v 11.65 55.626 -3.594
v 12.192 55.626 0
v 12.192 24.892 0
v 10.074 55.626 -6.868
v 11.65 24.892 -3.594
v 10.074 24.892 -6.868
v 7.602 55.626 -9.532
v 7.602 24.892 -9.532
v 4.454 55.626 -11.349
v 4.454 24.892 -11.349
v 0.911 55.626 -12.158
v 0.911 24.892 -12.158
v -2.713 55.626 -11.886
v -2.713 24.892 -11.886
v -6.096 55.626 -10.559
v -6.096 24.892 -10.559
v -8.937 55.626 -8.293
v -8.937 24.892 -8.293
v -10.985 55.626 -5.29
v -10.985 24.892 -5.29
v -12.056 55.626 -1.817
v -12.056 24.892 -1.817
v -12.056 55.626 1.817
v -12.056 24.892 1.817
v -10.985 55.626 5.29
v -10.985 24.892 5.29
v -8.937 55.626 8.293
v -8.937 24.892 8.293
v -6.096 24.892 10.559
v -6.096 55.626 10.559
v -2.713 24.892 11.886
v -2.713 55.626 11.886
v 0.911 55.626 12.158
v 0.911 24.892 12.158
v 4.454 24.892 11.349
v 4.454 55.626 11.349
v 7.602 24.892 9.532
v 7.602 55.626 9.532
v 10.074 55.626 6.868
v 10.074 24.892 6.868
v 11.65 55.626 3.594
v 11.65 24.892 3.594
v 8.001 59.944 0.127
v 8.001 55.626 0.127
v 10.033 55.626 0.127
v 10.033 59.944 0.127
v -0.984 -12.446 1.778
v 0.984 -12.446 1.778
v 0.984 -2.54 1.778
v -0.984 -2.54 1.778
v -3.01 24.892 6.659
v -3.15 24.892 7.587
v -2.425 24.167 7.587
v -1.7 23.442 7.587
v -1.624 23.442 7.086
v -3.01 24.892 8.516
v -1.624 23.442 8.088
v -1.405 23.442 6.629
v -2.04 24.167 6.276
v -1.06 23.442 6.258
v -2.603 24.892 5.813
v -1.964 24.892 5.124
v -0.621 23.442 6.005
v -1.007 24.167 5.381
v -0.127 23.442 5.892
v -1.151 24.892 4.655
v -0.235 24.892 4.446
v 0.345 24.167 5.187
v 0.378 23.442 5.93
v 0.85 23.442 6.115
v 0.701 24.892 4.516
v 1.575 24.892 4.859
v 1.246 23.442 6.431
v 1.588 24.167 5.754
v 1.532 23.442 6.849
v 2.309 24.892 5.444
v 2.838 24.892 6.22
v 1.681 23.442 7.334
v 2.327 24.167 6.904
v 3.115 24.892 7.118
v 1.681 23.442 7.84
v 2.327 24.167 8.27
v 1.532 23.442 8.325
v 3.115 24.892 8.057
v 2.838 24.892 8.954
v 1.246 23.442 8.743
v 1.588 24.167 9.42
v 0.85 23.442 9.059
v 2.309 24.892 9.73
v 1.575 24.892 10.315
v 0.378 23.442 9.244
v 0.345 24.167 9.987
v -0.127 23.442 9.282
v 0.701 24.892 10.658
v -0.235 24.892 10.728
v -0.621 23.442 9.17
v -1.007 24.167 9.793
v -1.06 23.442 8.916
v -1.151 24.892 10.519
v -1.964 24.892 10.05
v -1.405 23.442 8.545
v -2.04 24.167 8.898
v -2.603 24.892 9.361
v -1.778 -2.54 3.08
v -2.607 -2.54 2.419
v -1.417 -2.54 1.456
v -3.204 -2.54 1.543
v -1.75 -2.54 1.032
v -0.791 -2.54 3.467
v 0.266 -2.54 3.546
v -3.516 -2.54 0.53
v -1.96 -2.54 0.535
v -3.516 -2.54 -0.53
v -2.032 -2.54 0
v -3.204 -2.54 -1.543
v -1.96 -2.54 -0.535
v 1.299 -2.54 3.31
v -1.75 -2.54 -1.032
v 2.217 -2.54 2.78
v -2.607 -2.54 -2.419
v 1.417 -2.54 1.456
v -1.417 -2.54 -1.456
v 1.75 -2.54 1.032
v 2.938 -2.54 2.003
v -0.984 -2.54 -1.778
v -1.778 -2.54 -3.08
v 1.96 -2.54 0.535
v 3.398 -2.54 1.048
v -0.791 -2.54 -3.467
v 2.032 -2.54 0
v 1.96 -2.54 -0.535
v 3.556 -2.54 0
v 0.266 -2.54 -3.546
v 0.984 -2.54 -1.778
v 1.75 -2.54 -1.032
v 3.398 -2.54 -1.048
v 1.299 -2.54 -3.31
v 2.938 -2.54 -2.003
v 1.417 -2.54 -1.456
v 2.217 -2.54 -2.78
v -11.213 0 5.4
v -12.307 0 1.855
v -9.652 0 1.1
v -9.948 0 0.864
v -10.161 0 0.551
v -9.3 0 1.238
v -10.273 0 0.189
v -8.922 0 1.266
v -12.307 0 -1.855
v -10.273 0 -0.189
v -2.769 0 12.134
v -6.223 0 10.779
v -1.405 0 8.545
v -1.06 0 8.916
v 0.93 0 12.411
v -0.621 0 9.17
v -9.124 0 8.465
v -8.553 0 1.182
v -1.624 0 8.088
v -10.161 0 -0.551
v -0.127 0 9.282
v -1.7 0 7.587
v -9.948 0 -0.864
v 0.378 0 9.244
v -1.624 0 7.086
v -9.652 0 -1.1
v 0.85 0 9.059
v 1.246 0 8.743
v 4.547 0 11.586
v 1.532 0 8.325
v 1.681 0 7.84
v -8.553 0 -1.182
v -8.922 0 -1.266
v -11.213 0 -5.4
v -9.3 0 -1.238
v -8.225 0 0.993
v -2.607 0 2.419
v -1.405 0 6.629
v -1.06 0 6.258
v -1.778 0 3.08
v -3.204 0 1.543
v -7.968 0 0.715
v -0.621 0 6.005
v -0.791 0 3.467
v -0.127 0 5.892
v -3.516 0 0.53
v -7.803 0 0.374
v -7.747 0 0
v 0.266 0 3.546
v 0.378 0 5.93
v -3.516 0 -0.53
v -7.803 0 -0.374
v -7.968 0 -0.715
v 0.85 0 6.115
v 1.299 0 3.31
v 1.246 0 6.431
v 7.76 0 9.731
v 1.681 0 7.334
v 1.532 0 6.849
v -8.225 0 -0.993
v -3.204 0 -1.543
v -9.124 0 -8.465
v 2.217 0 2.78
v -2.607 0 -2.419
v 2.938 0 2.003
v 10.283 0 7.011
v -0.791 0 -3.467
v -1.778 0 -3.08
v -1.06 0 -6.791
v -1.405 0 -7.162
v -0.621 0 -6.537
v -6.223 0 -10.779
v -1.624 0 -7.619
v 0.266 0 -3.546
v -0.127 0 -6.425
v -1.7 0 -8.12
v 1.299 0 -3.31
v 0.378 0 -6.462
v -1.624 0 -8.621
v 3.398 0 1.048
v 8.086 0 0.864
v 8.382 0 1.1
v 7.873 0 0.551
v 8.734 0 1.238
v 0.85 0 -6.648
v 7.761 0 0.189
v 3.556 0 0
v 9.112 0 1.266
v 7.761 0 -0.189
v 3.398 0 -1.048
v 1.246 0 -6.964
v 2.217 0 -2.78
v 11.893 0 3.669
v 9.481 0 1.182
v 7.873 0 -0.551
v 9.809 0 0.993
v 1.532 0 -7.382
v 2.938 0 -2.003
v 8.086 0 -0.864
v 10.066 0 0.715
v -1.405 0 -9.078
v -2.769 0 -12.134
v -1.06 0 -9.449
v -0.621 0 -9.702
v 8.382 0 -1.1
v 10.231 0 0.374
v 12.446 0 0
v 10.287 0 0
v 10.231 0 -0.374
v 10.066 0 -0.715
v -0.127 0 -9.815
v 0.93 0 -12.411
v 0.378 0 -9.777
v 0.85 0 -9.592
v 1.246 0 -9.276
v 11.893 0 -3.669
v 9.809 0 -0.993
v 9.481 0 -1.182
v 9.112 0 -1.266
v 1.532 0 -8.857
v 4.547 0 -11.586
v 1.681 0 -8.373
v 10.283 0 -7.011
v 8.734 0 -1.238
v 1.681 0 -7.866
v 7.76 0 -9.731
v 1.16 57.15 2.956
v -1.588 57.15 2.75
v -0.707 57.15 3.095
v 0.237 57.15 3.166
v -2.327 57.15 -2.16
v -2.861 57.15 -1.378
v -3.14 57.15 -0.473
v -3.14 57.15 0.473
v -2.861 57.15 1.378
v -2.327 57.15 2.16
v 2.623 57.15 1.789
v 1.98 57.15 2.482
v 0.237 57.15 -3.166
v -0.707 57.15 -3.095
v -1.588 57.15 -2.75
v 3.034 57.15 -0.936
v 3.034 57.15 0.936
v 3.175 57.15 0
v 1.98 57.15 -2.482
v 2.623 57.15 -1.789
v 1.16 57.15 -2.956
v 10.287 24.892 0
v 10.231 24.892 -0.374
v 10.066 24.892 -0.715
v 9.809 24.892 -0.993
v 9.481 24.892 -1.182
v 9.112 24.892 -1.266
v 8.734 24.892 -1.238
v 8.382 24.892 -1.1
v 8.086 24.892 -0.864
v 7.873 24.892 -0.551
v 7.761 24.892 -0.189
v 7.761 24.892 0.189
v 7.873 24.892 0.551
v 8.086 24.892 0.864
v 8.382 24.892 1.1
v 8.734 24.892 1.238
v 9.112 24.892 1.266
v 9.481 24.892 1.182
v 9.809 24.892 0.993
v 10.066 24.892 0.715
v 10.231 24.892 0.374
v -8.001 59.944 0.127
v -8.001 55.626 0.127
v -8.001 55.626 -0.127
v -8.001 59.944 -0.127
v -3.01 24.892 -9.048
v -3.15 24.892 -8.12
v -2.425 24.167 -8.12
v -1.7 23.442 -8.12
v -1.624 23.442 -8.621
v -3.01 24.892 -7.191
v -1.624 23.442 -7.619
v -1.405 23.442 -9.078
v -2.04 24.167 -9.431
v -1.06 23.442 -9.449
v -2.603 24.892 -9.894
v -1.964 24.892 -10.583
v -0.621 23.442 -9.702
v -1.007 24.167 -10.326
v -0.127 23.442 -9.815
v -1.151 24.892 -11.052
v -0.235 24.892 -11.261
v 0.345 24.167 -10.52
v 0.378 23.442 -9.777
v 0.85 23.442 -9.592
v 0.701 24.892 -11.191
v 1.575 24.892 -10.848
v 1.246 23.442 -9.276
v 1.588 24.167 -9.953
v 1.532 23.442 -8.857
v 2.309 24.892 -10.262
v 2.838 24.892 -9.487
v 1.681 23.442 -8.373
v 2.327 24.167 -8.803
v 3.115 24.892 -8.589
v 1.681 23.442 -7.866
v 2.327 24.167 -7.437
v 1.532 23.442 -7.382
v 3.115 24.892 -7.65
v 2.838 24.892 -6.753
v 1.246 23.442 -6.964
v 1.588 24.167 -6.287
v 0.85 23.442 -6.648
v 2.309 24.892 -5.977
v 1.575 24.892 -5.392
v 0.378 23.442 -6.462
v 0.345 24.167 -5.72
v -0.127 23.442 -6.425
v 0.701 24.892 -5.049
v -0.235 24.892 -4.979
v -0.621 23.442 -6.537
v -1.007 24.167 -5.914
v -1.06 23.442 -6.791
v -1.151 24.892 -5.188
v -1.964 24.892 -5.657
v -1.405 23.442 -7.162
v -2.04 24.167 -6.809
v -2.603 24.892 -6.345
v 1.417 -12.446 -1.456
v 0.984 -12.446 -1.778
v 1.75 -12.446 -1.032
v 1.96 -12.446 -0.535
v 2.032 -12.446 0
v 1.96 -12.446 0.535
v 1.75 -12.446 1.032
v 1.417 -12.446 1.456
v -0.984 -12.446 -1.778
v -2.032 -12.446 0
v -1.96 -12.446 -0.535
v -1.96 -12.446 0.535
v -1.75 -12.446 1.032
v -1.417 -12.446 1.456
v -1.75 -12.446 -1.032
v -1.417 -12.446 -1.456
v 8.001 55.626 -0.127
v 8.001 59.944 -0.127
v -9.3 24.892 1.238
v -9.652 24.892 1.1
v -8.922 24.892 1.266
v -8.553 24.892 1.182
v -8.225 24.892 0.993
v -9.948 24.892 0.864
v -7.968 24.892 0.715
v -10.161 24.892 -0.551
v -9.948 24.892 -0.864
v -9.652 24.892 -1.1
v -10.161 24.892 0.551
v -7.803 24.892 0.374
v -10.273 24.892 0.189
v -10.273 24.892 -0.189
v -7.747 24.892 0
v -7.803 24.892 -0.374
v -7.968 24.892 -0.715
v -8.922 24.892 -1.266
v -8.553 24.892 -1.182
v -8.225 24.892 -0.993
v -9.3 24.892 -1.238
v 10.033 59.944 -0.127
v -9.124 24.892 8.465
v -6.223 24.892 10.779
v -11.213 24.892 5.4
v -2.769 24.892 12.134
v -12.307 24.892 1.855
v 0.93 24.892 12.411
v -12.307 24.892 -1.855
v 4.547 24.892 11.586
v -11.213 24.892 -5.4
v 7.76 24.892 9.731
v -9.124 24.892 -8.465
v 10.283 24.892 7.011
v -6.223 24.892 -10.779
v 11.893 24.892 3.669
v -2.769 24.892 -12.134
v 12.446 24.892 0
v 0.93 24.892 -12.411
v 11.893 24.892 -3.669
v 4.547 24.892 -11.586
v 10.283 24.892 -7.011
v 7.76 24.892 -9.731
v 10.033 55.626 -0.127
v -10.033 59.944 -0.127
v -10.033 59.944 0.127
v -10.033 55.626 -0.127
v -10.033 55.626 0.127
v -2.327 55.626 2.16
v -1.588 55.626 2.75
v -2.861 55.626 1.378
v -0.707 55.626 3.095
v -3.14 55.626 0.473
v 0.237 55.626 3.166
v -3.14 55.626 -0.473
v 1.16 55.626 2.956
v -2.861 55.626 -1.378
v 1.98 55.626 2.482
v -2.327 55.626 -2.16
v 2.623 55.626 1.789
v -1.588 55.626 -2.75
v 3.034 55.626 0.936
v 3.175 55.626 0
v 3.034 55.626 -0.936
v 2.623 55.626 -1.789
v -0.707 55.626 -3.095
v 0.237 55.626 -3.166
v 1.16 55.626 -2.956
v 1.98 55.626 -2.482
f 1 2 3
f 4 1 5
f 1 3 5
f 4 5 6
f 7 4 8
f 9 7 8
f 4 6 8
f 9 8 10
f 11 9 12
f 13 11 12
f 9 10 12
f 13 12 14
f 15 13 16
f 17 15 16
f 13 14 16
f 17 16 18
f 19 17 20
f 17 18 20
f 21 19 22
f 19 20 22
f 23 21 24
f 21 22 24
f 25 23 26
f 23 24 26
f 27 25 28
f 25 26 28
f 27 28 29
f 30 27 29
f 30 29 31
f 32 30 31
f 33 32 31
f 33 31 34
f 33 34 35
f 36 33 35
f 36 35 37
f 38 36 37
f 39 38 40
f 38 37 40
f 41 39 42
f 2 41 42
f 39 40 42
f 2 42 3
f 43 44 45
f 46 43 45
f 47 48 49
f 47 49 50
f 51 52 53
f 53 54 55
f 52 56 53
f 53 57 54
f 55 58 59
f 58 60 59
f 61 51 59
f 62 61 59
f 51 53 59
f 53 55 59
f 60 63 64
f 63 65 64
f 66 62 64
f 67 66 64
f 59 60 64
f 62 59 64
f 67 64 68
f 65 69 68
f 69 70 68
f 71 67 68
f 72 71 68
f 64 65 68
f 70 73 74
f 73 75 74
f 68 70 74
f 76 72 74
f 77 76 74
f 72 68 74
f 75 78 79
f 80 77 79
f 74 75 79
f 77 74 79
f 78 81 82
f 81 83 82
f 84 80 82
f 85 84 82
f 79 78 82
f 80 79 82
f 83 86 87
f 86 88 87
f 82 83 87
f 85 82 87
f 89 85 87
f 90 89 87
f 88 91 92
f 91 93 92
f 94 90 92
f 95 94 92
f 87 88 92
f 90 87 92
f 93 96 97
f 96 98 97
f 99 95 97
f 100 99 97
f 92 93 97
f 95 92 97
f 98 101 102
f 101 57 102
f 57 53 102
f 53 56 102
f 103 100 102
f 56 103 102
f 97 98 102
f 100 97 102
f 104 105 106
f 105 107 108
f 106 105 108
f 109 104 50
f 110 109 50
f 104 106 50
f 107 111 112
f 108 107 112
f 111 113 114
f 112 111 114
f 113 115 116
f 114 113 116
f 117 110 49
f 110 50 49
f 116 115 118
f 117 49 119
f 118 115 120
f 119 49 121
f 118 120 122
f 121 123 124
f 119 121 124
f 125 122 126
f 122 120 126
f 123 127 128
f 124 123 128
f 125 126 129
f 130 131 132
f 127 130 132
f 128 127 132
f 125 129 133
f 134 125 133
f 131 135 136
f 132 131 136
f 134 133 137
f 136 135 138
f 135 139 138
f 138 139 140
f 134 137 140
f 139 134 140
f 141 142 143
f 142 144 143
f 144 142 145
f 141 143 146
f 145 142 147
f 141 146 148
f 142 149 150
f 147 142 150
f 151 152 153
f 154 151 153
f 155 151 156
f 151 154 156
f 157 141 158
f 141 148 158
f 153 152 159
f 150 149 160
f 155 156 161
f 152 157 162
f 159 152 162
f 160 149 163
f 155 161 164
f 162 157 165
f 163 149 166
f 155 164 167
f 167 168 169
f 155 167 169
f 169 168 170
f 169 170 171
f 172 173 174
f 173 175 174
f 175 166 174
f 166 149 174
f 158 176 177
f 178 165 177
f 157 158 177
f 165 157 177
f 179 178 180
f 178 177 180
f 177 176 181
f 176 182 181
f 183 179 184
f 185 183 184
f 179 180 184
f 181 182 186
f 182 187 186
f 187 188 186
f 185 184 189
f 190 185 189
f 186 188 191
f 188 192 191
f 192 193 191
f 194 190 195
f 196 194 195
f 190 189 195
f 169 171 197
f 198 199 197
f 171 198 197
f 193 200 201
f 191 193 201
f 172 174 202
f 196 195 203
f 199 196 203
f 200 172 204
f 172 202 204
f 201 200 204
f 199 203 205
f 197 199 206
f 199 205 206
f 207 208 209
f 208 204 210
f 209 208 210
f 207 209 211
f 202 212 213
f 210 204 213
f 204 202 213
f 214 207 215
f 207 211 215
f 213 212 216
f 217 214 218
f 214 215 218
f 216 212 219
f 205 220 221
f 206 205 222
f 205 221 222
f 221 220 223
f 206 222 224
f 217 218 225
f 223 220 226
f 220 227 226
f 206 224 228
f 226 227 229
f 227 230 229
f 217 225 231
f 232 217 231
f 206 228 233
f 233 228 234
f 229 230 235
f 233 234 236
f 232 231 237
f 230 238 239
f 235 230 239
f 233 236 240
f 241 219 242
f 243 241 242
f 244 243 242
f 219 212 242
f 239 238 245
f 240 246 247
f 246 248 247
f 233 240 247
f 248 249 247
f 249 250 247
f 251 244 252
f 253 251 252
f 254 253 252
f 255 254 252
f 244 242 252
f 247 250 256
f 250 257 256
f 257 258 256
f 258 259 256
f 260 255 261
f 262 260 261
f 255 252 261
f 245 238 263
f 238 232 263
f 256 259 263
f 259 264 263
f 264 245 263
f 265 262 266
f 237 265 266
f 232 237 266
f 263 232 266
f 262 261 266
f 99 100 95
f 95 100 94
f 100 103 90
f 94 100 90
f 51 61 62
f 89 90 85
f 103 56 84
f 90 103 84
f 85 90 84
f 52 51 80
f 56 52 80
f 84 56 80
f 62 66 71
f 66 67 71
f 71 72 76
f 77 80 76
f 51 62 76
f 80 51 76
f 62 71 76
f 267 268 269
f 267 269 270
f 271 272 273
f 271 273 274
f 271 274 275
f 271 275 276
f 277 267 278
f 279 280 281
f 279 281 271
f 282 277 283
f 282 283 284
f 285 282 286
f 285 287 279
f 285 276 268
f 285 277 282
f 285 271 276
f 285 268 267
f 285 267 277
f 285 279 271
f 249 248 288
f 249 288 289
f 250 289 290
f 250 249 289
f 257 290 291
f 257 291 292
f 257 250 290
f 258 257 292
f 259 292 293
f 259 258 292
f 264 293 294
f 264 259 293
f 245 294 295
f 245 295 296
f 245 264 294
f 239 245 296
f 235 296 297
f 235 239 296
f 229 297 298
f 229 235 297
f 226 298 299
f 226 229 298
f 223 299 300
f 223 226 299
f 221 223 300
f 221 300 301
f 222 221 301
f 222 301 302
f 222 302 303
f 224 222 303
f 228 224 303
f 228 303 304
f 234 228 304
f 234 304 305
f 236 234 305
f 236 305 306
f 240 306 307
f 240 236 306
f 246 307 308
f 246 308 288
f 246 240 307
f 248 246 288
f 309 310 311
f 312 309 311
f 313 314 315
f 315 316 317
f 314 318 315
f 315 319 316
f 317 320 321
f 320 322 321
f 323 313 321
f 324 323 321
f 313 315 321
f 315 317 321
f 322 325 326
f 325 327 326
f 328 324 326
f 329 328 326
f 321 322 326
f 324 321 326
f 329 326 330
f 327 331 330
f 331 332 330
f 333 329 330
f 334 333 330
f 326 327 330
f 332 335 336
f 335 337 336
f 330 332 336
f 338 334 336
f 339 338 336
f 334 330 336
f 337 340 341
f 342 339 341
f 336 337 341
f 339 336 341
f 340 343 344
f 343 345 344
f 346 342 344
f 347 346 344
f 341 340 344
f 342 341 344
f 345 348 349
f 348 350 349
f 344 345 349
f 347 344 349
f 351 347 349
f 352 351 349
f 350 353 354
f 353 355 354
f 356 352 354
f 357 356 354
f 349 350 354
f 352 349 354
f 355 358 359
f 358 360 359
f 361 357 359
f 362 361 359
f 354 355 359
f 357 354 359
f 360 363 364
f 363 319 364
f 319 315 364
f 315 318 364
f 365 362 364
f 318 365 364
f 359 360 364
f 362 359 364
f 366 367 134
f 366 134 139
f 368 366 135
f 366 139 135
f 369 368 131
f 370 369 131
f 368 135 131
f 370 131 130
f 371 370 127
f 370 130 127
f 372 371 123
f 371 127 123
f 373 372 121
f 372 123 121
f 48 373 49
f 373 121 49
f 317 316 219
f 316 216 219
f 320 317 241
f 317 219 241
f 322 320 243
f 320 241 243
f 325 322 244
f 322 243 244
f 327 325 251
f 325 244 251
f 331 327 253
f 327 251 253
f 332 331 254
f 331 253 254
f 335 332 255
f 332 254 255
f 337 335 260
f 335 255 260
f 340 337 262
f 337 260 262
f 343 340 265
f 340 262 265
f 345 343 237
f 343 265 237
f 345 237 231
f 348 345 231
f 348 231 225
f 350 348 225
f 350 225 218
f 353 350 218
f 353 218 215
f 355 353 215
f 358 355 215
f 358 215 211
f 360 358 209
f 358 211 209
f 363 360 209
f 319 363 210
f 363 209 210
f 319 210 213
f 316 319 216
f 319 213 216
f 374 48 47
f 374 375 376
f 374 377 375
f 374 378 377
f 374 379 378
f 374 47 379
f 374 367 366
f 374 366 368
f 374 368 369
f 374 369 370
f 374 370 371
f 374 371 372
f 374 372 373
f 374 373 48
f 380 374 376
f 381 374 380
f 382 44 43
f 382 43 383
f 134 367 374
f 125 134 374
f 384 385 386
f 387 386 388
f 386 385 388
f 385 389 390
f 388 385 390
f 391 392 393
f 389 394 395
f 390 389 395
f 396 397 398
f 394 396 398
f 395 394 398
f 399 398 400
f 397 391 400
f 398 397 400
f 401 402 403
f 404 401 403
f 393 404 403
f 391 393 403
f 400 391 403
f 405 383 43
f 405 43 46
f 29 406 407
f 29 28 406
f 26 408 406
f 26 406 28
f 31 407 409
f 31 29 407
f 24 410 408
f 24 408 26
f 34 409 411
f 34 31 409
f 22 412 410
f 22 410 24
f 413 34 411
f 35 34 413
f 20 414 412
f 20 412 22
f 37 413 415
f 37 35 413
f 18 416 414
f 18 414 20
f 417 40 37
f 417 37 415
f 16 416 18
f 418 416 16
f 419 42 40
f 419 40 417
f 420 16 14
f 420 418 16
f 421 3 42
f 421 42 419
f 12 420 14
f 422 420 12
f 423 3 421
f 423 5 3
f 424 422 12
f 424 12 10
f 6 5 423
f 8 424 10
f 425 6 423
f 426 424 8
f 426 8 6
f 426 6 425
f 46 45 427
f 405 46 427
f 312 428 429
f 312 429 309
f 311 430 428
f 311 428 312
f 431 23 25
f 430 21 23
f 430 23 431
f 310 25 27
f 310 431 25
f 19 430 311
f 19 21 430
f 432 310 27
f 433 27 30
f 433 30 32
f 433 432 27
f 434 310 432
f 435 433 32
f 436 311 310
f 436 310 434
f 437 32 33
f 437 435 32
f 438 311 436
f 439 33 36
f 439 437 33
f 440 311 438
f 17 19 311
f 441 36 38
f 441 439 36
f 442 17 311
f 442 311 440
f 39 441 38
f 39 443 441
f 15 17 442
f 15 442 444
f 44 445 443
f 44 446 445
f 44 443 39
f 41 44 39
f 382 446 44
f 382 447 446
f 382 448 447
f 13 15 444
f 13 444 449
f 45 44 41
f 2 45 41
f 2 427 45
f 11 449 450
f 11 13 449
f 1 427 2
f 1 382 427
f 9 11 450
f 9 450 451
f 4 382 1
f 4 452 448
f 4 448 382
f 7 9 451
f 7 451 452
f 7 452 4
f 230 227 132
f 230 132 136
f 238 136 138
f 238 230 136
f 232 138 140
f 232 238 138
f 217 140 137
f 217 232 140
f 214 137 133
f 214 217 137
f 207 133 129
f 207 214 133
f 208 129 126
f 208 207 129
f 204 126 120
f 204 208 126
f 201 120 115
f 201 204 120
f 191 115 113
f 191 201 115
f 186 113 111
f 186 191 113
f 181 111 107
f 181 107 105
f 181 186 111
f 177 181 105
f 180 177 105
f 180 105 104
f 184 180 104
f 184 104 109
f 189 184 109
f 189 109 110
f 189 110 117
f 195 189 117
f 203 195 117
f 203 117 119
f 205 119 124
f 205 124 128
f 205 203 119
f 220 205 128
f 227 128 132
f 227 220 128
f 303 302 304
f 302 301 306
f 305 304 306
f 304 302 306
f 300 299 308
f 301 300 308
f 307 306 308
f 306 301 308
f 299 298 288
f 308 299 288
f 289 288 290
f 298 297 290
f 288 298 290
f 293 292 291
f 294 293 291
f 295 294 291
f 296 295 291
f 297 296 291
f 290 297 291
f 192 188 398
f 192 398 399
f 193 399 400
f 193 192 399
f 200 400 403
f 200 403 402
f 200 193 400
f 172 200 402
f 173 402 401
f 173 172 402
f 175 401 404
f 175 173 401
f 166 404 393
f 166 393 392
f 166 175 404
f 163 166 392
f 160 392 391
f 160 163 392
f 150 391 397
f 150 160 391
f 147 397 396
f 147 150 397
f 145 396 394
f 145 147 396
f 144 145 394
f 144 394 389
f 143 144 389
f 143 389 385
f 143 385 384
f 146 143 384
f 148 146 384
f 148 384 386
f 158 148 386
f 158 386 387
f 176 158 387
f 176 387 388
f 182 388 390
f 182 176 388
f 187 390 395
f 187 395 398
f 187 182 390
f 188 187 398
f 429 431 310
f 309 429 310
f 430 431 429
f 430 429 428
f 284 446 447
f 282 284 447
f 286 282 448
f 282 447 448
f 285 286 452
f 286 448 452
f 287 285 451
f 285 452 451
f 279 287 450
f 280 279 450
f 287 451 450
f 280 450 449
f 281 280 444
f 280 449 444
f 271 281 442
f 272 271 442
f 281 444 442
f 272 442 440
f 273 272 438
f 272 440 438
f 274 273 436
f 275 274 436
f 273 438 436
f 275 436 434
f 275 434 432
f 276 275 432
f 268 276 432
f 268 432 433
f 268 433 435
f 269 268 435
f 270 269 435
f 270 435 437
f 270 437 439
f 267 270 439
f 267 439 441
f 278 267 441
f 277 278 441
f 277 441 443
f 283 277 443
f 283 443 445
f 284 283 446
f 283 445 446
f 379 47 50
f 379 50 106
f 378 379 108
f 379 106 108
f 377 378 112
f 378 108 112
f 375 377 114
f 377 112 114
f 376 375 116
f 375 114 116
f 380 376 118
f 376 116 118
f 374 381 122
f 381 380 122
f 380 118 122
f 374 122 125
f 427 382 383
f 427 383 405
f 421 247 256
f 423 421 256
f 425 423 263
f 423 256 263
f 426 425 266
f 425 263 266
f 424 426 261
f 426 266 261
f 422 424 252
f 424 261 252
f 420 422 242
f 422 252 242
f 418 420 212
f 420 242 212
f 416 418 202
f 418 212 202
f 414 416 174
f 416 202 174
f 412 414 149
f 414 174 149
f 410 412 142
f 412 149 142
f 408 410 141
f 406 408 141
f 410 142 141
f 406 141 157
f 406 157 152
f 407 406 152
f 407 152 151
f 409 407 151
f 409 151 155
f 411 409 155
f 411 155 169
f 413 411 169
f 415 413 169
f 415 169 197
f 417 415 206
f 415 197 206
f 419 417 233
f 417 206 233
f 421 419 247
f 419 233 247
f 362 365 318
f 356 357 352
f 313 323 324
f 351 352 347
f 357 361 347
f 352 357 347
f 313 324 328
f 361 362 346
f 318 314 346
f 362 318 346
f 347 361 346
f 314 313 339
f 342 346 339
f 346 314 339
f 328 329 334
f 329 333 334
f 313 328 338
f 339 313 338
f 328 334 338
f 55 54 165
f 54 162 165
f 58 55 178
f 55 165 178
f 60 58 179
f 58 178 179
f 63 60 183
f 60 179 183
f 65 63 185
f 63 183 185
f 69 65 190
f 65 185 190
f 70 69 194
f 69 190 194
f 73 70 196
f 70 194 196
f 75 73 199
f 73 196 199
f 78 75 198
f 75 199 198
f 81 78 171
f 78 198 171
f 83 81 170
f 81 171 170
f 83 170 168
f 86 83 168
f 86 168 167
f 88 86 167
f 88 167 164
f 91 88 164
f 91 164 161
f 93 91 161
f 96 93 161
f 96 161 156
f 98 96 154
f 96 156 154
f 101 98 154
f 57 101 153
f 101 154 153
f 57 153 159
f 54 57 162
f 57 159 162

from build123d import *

# Parameters (mm, degrees)
SKETCH1_R                                       = 12.446
SKETCH1_R_2                                     = 1.27
BOSS_EXTRUDE1_DEPTH                             = 24.892
CSK_FOR_M3_FLAT_HEAD_MACHINE_SCREW1_D           = 3.4
CSK_FOR_M3_FLAT_HEAD_MACHINE_SCREW1_CSINK_D     = 6.3
CSK_FOR_M3_FLAT_HEAD_MACHINE_SCREW1_CSINK_ANGLE = 90
SKETCH5_R                                       = 12.192
BOSS_EXTRUDE2_DEPTH                             = 30.734
SKETCH6_R                                       = 3.556
BOSS_EXTRUDE3_DEPTH                             = 2.54
SKETCH7_R                                       = 2.032
BOSS_EXTRUDE4_DEPTH                             = 9.906
SKETCH8_W                                       = 2.032
SKETCH8_H                                       = 0.254
CUT_EXTRUDE2_DEPTH                              = 9.906
SKETCH9_R                                       = 3.175
BOSS_EXTRUDE5_DEPTH                             = 1.524
SKETCH10_W                                      = 2.032
SKETCH10_H                                      = 0.254
BOSS_EXTRUDE6_DEPTH                             = 4.318


with BuildPart() as part:
    # Sketch1 → Boss-Extrude1 (new body)
    with BuildSketch(Plane(origin=(0, 0, 0), x_dir=(1, 0, 0), z_dir=(0, 1, 0))):
        Circle(SKETCH1_R)
        with Locations((-9.017, 0)):
            Circle(SKETCH1_R_2, mode=Mode.SUBTRACT)
        with Locations((9.017, 0)):
            Circle(SKETCH1_R_2, mode=Mode.SUBTRACT)
    extrude(amount=BOSS_EXTRUDE1_DEPTH)

    # CSK for M3 Flat Head Machine Screw1 (through all)
    with Locations(Plane(origin=(0, 24.892, 0), x_dir=(1, 0, 0), z_dir=(0, 1, 0))):
        with Locations((0, 8.119865968), (0, -7.587036194)):
            CounterSinkHole(CSK_FOR_M3_FLAT_HEAD_MACHINE_SCREW1_D / 2, CSK_FOR_M3_FLAT_HEAD_MACHINE_SCREW1_CSINK_D / 2, counter_sink_angle=CSK_FOR_M3_FLAT_HEAD_MACHINE_SCREW1_CSINK_ANGLE)

    # Sketch5 → Boss-Extrude2 (add)
    with BuildSketch(Plane(origin=(0, 24.892, 0), x_dir=(1, 0, 0), z_dir=(0, 1, 0))):
        Circle(SKETCH5_R)
    extrude(amount=BOSS_EXTRUDE2_DEPTH)

    # Sketch6 → Boss-Extrude3 (add)
    with BuildSketch(Plane(origin=(0, 0, 0), x_dir=(1, 0, 0), z_dir=(0, 1, 0))):
        Circle(SKETCH6_R)
    extrude(amount=-BOSS_EXTRUDE3_DEPTH)

    # Sketch7 → Boss-Extrude4 (add)
    with BuildSketch(Plane(origin=(0, -2.54, 0), x_dir=(-1, 0, 0), z_dir=(0, -1, 0))):
        Circle(SKETCH7_R)
    extrude(amount=BOSS_EXTRUDE4_DEPTH)

    # Sketch8 → Cut-Extrude2 (cut)
    with BuildSketch(Plane(origin=(0, -12.446, 0), x_dir=(-1, 0, 0), z_dir=(0, -1, 0))):
        with Locations((0, -1.905)):
            Rectangle(SKETCH8_W, SKETCH8_H)
        with Locations((0, 1.905)):
            Rectangle(SKETCH8_W, SKETCH8_H)
    extrude(amount=-CUT_EXTRUDE2_DEPTH, mode=Mode.SUBTRACT)

    # Sketch9 → Boss-Extrude5 (add)
    with BuildSketch(Plane(origin=(0, 55.626, 0), x_dir=(1, 0, 0), z_dir=(0, 1, 0))):
        Circle(SKETCH9_R)
    extrude(amount=BOSS_EXTRUDE5_DEPTH)

    # Sketch10 → Boss-Extrude6 (add)
    with BuildSketch(Plane(origin=(0, 55.626, 0), x_dir=(1, 0, 0), z_dir=(0, 1, 0))):
        with Locations((-9.017, 0)):
            Rectangle(SKETCH10_W, SKETCH10_H)
        with Locations((9.017, 0)):
            Rectangle(SKETCH10_W, SKETCH10_H)
    extrude(amount=BOSS_EXTRUDE6_DEPTH)


solid = part.part
